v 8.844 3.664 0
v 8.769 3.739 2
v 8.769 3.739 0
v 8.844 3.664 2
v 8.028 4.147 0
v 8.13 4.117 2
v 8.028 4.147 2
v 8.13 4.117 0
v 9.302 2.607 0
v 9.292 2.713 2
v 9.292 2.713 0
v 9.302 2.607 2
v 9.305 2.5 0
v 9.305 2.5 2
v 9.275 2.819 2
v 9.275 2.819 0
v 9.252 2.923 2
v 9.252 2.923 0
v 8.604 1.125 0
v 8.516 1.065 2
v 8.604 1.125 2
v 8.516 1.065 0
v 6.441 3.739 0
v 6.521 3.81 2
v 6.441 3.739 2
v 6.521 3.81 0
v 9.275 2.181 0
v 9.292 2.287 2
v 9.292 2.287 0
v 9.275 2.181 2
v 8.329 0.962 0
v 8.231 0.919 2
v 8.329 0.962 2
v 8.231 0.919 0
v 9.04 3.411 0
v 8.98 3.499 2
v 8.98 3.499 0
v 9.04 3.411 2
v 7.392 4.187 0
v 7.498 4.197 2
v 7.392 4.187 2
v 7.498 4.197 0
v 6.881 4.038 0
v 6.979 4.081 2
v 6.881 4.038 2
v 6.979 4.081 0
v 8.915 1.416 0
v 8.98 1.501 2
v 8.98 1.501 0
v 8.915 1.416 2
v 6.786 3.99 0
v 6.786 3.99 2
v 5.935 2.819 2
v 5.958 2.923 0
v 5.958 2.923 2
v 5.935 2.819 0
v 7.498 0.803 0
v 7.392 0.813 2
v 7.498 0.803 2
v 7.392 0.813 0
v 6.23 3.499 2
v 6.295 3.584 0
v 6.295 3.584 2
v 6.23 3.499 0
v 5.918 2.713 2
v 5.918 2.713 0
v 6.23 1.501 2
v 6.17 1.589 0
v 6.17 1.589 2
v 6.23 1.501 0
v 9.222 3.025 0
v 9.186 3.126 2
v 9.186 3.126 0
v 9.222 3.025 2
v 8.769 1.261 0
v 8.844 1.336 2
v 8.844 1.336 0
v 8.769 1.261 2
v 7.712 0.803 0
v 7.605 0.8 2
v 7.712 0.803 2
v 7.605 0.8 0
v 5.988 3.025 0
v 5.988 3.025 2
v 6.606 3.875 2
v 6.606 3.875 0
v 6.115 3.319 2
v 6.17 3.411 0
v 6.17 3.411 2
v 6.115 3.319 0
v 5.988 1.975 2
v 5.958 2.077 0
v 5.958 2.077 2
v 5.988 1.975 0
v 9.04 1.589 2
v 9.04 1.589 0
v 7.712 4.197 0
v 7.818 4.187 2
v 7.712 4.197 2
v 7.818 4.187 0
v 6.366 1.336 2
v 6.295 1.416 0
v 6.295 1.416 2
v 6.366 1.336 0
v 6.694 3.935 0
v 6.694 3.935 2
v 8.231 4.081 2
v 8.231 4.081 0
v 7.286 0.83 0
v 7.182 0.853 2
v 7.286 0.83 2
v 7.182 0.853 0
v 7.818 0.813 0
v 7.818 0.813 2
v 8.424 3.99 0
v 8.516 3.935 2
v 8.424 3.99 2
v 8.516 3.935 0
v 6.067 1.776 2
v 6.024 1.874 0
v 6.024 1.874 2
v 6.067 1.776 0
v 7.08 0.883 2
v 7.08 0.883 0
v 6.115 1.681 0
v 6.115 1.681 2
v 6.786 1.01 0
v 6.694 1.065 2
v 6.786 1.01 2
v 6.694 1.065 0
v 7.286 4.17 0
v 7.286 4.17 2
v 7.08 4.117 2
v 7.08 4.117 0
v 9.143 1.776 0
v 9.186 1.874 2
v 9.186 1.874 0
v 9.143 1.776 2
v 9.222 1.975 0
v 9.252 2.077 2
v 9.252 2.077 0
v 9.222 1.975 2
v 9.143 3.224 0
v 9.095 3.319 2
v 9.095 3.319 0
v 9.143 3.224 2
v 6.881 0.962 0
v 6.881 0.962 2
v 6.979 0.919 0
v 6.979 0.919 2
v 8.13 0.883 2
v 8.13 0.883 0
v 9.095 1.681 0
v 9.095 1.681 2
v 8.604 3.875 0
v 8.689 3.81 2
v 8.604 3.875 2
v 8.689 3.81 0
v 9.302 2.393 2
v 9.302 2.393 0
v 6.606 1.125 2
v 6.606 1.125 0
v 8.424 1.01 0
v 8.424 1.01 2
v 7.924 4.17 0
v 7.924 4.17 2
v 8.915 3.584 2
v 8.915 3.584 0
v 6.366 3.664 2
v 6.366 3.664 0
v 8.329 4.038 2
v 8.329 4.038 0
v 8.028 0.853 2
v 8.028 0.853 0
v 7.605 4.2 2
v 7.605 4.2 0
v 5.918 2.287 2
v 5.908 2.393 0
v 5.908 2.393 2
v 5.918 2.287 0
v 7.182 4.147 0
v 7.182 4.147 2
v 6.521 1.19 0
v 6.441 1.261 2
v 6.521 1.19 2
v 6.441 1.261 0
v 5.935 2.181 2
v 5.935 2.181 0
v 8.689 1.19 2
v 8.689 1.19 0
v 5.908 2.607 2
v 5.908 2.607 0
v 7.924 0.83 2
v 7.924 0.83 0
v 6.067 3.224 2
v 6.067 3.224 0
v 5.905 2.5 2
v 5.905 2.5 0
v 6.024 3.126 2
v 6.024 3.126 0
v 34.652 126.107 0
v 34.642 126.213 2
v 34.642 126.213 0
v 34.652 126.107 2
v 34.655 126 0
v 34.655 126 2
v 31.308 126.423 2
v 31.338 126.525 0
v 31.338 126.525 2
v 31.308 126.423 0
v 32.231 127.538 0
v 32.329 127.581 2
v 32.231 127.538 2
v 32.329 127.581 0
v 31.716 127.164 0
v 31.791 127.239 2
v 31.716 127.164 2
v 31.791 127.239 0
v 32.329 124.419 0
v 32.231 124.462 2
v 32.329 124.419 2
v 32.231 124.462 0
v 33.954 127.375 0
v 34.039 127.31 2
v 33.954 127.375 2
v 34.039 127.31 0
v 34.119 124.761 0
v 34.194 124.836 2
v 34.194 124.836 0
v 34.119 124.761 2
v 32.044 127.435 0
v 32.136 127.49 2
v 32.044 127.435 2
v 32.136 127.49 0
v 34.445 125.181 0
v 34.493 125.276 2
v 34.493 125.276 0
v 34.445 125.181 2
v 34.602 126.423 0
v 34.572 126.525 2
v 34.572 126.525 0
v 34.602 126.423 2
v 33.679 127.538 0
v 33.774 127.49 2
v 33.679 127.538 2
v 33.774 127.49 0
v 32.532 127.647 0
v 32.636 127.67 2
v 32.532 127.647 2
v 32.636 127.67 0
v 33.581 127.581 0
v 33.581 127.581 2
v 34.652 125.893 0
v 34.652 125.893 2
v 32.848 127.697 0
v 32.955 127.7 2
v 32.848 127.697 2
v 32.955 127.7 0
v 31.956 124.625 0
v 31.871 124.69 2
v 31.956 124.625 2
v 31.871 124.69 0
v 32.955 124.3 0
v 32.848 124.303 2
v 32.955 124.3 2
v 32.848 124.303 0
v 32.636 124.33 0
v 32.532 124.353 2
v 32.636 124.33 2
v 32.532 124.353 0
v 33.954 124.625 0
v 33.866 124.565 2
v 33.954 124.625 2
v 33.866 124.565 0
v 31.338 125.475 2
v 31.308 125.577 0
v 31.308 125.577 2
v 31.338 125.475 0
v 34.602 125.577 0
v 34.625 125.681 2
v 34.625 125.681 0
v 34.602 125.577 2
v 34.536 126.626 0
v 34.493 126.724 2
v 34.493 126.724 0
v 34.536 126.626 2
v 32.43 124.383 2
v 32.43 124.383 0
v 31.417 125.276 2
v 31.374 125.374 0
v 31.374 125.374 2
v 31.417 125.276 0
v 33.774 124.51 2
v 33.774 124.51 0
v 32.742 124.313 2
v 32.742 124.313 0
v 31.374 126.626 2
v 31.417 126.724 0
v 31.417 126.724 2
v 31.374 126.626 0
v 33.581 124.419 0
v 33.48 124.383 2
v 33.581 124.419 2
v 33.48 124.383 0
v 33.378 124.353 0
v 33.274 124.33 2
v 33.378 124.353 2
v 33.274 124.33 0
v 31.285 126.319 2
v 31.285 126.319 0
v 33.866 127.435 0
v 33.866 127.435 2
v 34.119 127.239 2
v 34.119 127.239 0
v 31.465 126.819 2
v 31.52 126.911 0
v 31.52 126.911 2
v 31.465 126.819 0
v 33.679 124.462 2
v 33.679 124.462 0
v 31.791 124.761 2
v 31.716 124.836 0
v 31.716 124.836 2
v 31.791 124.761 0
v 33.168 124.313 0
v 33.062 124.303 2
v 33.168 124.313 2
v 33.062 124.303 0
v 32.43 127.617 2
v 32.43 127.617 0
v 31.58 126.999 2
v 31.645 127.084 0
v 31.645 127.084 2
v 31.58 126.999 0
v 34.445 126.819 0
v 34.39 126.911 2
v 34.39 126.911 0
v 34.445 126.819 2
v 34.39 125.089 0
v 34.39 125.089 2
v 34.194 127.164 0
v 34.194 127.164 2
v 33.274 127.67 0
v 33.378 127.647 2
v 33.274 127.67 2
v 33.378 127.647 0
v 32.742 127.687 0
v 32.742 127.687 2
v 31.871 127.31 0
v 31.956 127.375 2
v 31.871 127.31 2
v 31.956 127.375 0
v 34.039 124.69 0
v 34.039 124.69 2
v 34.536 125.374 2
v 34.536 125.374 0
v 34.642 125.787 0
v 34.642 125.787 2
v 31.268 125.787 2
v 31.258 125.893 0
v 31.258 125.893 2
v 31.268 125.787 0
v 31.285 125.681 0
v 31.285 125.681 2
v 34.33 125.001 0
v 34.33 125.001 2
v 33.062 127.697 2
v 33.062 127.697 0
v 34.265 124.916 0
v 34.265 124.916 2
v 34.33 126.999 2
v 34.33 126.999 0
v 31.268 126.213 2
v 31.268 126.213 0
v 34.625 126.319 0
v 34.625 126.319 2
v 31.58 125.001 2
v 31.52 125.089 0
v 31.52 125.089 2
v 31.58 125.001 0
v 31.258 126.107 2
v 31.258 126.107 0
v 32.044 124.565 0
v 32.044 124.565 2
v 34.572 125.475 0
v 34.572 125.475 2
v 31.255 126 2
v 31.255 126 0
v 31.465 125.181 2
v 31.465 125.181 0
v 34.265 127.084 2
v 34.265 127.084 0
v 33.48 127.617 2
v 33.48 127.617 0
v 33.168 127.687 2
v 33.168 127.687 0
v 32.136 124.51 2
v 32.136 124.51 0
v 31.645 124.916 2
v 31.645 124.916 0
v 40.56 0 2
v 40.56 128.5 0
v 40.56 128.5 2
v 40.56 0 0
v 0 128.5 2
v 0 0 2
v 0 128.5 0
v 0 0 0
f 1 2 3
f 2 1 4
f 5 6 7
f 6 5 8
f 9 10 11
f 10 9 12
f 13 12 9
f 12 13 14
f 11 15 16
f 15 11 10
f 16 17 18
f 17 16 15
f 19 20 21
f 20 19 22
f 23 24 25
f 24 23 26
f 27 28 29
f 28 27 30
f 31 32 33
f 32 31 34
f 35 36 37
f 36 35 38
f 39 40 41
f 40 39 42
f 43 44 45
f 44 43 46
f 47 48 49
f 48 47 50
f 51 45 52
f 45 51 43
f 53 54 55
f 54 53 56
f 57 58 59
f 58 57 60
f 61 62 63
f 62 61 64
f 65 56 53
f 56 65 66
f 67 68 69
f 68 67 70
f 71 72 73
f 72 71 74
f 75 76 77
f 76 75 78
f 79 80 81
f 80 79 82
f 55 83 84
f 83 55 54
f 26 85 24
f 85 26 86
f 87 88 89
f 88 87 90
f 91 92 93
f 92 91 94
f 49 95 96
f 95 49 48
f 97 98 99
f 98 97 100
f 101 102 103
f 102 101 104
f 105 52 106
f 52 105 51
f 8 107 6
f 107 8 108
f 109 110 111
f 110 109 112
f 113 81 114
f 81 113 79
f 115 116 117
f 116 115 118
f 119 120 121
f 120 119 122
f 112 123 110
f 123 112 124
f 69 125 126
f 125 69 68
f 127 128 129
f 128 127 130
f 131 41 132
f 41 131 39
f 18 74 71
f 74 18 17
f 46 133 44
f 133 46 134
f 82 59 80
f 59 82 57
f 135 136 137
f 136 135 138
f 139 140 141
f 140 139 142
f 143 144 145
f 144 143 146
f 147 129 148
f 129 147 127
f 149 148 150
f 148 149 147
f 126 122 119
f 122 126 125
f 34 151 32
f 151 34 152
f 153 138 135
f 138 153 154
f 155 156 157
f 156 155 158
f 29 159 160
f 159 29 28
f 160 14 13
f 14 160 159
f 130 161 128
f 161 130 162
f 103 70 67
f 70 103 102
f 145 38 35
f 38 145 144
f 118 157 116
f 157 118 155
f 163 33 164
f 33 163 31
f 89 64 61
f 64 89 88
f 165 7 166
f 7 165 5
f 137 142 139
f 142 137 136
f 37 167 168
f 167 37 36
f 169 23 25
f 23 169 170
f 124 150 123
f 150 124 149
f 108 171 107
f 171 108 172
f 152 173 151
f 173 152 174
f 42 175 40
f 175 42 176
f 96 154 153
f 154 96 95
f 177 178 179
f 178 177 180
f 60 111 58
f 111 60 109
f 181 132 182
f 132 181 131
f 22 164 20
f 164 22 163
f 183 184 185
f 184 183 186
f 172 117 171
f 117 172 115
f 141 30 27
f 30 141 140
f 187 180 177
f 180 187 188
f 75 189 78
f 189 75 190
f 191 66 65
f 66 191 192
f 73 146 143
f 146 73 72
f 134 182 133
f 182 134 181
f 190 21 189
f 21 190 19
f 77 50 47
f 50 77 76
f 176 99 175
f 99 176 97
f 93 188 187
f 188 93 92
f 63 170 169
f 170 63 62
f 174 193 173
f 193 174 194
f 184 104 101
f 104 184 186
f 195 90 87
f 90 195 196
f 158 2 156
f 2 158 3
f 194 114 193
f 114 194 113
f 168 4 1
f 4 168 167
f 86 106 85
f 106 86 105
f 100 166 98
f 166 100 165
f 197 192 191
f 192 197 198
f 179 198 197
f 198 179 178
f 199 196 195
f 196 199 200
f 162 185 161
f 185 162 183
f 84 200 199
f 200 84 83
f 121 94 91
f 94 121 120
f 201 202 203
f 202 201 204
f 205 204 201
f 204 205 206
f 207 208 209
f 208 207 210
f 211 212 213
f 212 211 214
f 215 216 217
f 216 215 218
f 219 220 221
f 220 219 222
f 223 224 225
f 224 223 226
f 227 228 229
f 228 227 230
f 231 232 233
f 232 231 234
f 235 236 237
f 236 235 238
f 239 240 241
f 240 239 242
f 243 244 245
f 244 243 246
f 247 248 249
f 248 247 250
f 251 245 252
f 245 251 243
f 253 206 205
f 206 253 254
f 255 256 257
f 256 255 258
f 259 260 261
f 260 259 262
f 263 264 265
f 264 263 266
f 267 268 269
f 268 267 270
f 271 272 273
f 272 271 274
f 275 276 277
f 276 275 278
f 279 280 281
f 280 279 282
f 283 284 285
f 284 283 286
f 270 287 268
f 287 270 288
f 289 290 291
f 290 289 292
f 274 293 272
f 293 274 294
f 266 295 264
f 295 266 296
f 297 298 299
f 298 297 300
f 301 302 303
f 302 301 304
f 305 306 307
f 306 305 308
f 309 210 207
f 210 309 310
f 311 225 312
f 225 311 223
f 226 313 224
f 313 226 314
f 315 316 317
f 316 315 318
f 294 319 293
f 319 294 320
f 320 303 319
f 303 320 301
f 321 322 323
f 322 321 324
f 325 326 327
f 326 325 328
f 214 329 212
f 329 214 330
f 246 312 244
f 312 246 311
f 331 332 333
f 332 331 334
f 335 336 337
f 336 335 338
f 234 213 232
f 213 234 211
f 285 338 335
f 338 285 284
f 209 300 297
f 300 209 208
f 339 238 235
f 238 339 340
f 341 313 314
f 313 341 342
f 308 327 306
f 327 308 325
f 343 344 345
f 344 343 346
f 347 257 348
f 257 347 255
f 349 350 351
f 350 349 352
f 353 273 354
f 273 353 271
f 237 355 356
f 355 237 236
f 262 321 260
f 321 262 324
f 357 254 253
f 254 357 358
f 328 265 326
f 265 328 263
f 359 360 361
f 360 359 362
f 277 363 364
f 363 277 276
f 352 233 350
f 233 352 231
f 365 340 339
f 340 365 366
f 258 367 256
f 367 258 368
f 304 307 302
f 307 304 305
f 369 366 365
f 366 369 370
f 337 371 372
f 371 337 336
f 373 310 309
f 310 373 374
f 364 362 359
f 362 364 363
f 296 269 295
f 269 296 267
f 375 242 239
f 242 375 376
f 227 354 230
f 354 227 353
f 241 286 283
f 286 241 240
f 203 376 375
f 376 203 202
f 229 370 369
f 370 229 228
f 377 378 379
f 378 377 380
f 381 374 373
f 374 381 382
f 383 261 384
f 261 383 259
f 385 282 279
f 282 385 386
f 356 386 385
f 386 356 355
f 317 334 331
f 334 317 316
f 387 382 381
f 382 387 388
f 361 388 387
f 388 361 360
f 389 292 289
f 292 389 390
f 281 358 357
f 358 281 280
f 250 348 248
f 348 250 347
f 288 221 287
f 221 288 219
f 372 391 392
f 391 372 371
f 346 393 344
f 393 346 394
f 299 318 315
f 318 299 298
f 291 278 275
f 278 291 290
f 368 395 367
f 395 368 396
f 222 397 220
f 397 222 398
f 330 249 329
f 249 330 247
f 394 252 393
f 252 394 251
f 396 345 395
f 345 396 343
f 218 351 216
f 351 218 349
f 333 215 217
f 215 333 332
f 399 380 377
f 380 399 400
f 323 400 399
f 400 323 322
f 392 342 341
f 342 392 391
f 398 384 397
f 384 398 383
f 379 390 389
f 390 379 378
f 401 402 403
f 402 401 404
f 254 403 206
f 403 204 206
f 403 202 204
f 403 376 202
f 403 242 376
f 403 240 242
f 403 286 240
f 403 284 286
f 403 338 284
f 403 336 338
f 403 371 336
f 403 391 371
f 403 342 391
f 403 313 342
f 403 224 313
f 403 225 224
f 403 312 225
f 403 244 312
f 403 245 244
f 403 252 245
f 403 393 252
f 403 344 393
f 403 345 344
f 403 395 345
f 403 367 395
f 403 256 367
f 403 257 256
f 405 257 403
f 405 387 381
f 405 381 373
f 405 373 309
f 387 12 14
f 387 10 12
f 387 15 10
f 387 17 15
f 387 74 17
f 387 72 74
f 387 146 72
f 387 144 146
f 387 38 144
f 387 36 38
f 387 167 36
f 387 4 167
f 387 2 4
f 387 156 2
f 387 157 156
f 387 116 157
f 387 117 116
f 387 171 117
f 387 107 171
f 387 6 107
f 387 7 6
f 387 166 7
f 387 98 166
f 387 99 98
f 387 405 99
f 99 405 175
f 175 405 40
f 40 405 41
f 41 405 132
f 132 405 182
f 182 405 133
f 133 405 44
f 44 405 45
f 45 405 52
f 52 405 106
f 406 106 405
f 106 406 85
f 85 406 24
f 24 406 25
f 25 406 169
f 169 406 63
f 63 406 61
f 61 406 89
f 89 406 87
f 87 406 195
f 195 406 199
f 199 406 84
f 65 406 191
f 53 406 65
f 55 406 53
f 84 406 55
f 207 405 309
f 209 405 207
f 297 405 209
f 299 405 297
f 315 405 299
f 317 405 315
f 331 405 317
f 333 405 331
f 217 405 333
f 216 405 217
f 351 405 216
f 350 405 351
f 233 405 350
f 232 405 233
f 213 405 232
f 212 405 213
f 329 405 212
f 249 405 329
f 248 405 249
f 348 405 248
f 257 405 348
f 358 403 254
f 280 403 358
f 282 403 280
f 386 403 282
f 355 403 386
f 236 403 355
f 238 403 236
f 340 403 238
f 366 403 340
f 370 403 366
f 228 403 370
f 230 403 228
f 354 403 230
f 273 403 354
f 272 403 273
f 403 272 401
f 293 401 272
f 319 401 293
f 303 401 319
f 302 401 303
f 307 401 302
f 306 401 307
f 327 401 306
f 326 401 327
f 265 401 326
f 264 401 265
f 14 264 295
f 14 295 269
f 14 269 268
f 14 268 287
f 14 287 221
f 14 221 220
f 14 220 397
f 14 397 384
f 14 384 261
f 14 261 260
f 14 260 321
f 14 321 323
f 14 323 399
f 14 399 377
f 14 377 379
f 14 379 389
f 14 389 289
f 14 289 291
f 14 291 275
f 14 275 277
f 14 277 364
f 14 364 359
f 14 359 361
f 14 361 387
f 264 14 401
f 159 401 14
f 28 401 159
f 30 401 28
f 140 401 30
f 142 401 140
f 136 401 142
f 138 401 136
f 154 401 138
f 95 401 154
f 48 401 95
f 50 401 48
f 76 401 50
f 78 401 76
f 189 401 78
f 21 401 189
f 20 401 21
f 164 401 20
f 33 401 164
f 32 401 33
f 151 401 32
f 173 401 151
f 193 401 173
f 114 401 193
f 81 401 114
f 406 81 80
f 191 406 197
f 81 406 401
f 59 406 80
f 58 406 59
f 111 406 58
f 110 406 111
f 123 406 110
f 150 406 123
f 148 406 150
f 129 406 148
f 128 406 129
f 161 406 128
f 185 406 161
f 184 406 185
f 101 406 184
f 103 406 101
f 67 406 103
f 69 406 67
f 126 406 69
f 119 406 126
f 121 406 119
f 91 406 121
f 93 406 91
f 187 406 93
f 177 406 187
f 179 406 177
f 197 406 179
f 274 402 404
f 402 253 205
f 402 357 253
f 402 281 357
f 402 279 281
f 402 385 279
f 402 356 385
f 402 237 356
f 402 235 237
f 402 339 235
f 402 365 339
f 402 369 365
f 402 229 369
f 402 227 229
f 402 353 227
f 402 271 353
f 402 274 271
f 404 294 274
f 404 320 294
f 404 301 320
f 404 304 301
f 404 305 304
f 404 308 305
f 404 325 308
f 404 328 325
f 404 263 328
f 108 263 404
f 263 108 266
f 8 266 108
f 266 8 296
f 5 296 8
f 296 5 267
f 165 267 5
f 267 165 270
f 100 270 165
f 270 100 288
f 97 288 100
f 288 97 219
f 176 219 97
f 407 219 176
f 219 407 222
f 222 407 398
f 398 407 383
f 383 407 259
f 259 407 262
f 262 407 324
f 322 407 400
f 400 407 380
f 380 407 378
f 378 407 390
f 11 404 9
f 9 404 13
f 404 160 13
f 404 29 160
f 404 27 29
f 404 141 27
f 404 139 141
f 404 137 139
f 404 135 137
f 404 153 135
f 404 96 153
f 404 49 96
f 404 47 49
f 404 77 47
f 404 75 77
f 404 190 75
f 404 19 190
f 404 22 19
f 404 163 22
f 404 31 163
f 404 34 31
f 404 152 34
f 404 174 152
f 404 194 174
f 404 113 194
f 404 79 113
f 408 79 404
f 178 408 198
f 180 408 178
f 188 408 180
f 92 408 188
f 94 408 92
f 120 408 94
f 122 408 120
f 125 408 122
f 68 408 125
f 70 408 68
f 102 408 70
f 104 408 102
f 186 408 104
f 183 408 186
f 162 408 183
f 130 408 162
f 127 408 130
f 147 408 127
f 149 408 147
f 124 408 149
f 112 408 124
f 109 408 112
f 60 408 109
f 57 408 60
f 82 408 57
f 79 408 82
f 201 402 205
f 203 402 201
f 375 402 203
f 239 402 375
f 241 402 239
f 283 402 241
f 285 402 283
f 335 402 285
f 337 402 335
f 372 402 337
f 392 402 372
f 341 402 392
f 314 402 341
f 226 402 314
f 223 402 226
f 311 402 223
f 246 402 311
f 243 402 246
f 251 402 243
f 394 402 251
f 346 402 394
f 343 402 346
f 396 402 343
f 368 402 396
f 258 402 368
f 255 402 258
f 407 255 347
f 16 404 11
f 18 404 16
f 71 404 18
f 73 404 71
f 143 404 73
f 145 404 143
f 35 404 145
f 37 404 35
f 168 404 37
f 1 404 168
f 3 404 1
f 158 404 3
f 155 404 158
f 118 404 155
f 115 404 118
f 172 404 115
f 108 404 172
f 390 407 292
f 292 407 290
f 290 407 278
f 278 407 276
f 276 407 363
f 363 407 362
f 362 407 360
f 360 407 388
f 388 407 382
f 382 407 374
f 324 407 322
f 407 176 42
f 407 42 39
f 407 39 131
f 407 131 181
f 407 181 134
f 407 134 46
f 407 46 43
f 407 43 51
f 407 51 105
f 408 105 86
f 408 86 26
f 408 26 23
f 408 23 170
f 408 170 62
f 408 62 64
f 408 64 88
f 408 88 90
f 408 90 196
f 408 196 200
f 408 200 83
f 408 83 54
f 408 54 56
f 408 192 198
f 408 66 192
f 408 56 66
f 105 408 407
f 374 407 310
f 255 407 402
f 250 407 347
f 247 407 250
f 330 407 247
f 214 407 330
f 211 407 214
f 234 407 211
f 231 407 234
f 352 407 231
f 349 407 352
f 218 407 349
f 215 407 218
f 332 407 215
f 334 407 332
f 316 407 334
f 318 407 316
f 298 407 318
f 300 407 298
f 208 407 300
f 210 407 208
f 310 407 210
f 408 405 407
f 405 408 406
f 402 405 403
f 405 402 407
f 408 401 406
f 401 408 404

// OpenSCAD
/* [Default values] */
// Line segments for circles
FN = 100; // [1:1:360]
// Unit size (mm)
U = 44.45;
// Horizontal pitch size (mm)
HP = 5.07; // 5.07 for a little bit of margin

$fn=FN;

/* [Panel] */
// Height of module (mm) - Would not change this if you are using Eurorack
height = 128.5; // A little less then 3U
// Thickness of module (mm) - Would not change this if you are using Eurorack
thickness = 2;  // Website specifies a thickness of 2mm
// Width of module (HP)
width = 8; // [1:1:84]

/* [Holes] */
// Four hole threshold (HP)
four_hole_threshold = 10;
// Center two holes
two_holes_type = "opposite"; // [center, opposite, mirror]
// Hole radius (mm)
hole_r = 1.7;
// Hole distance from the side (HP)
hole_dist_side = hp_mm(1.5);
// Hole distance from the top (mm)
hole_dist_top = 2.5;

panel(width);


// h[p]
module panel(h) {
    width_mm = hp_mm(h);
    difference() {
        cube(size = [width_mm, height, thickness]);
        
        if (h < four_hole_threshold) {
            if (two_holes_type == "center") {
                translate([width_mm/2, hole_dist_top, -1])
                cylinder(r=hole_r, h=thickness*2);
           
                translate([width_mm/2, height-hole_dist_top, -1])
                cylinder(r=hole_r, h=thickness*2); 
            } else if (two_holes_type == "opposite") {
                translate([hole_dist_side, hole_dist_top, -1])
                cylinder(r=hole_r, h=thickness*2);
           
                translate([width_mm - hole_dist_side, height-hole_dist_top, -1])
                cylinder(r=hole_r, h=thickness*2); 
            } else if (two_holes_type == "mirror") {
                translate([hole_dist_side, hole_dist_top, -1])
                cylinder(r=hole_r, h=thickness*2);
           
                translate([hole_dist_side, height-hole_dist_top, -1])
                cylinder(r=hole_r, h=thickness*2); 
            }
        } else {
            translate([hole_dist_side, hole_dist_top, -1])
            cylinder(r=hole_r, h=thickness*2);
           
            translate([hole_dist_side, height - hole_dist_top, -1])
            cylinder(r=hole_r, h=thickness*2);
            
            translate([width_mm - hole_dist_side, hole_dist_top, -1])
            cylinder(r=hole_r, h=thickness*2);
           
            translate([width_mm - hole_dist_side, height - hole_dist_top, -1])
            cylinder(r=hole_r, h=thickness*2); 
        }
    }
}

// http://www.rean-connectors.com/en/products/din-chassis-connectors/nys325
module nys325_midi_socket() {
    cylinder(r=7.55, h=thickness*2);
    translate([0, 11.3, -1])
    cylinder(r=1.6, h=thickness*2);
    translate([0, -11.3, -1])
    cylinder(r=1.6, h=thickness*2);
}

module audio_jack_3_5mm() {
    cylinder(r=3, h=thickness*2);
}

module toggle_switch_6_8mm() {
    cylinder(r=3.4, h=thickness*2);
}
// http://www.mouser.com/ds/2/414/Datasheet_RotaryPanelPot_P160series-1133272.pdf
module pot_p160() {
    cylinder(r=3.75, h=thickness*2);
    translate([7.8, 0, -1])
    cylinder(r=1.5, h=thickness*2);
}

// https://www.elfa.se/Web/Downloads/_t/ds/els-511sygwa-s530-e1_eng_tds.pdf
module x1_7seg_14_22mm_display() {
    cube([12.25, 19.25, thickness]);
}

module x2_7seg_14_22mm_display() {
    cube([25, 19.25, thickness]);
}

// https://www.elfa.se/Web/Downloads/2e/wa/qmCC56-12EWA.pdf
module x4_7seg_14_22mm_display() {
    cube([50.5, 19.25, thickness]);
}

// https://cdn.sparkfun.com/datasheets/Components/Switches/MX%20Series.pdf
module cherry_mx_button() {
	union(){
		cube([14,14,thickness]);

		translate([-1,1,0])
		cube([14+2*1,thickness,thickness]);

		translate([-1,14-1-3,0])
		cube([14+2*1,3,thickness]);
	}
}
// 1U  = 1.75" = 44.45mm
// 1HP = 1/5"  = 5.08mm

// u[nits]
function units_mm(u) = u * U; 

// h[p]
function hp_mm(h) = h * HP; 
